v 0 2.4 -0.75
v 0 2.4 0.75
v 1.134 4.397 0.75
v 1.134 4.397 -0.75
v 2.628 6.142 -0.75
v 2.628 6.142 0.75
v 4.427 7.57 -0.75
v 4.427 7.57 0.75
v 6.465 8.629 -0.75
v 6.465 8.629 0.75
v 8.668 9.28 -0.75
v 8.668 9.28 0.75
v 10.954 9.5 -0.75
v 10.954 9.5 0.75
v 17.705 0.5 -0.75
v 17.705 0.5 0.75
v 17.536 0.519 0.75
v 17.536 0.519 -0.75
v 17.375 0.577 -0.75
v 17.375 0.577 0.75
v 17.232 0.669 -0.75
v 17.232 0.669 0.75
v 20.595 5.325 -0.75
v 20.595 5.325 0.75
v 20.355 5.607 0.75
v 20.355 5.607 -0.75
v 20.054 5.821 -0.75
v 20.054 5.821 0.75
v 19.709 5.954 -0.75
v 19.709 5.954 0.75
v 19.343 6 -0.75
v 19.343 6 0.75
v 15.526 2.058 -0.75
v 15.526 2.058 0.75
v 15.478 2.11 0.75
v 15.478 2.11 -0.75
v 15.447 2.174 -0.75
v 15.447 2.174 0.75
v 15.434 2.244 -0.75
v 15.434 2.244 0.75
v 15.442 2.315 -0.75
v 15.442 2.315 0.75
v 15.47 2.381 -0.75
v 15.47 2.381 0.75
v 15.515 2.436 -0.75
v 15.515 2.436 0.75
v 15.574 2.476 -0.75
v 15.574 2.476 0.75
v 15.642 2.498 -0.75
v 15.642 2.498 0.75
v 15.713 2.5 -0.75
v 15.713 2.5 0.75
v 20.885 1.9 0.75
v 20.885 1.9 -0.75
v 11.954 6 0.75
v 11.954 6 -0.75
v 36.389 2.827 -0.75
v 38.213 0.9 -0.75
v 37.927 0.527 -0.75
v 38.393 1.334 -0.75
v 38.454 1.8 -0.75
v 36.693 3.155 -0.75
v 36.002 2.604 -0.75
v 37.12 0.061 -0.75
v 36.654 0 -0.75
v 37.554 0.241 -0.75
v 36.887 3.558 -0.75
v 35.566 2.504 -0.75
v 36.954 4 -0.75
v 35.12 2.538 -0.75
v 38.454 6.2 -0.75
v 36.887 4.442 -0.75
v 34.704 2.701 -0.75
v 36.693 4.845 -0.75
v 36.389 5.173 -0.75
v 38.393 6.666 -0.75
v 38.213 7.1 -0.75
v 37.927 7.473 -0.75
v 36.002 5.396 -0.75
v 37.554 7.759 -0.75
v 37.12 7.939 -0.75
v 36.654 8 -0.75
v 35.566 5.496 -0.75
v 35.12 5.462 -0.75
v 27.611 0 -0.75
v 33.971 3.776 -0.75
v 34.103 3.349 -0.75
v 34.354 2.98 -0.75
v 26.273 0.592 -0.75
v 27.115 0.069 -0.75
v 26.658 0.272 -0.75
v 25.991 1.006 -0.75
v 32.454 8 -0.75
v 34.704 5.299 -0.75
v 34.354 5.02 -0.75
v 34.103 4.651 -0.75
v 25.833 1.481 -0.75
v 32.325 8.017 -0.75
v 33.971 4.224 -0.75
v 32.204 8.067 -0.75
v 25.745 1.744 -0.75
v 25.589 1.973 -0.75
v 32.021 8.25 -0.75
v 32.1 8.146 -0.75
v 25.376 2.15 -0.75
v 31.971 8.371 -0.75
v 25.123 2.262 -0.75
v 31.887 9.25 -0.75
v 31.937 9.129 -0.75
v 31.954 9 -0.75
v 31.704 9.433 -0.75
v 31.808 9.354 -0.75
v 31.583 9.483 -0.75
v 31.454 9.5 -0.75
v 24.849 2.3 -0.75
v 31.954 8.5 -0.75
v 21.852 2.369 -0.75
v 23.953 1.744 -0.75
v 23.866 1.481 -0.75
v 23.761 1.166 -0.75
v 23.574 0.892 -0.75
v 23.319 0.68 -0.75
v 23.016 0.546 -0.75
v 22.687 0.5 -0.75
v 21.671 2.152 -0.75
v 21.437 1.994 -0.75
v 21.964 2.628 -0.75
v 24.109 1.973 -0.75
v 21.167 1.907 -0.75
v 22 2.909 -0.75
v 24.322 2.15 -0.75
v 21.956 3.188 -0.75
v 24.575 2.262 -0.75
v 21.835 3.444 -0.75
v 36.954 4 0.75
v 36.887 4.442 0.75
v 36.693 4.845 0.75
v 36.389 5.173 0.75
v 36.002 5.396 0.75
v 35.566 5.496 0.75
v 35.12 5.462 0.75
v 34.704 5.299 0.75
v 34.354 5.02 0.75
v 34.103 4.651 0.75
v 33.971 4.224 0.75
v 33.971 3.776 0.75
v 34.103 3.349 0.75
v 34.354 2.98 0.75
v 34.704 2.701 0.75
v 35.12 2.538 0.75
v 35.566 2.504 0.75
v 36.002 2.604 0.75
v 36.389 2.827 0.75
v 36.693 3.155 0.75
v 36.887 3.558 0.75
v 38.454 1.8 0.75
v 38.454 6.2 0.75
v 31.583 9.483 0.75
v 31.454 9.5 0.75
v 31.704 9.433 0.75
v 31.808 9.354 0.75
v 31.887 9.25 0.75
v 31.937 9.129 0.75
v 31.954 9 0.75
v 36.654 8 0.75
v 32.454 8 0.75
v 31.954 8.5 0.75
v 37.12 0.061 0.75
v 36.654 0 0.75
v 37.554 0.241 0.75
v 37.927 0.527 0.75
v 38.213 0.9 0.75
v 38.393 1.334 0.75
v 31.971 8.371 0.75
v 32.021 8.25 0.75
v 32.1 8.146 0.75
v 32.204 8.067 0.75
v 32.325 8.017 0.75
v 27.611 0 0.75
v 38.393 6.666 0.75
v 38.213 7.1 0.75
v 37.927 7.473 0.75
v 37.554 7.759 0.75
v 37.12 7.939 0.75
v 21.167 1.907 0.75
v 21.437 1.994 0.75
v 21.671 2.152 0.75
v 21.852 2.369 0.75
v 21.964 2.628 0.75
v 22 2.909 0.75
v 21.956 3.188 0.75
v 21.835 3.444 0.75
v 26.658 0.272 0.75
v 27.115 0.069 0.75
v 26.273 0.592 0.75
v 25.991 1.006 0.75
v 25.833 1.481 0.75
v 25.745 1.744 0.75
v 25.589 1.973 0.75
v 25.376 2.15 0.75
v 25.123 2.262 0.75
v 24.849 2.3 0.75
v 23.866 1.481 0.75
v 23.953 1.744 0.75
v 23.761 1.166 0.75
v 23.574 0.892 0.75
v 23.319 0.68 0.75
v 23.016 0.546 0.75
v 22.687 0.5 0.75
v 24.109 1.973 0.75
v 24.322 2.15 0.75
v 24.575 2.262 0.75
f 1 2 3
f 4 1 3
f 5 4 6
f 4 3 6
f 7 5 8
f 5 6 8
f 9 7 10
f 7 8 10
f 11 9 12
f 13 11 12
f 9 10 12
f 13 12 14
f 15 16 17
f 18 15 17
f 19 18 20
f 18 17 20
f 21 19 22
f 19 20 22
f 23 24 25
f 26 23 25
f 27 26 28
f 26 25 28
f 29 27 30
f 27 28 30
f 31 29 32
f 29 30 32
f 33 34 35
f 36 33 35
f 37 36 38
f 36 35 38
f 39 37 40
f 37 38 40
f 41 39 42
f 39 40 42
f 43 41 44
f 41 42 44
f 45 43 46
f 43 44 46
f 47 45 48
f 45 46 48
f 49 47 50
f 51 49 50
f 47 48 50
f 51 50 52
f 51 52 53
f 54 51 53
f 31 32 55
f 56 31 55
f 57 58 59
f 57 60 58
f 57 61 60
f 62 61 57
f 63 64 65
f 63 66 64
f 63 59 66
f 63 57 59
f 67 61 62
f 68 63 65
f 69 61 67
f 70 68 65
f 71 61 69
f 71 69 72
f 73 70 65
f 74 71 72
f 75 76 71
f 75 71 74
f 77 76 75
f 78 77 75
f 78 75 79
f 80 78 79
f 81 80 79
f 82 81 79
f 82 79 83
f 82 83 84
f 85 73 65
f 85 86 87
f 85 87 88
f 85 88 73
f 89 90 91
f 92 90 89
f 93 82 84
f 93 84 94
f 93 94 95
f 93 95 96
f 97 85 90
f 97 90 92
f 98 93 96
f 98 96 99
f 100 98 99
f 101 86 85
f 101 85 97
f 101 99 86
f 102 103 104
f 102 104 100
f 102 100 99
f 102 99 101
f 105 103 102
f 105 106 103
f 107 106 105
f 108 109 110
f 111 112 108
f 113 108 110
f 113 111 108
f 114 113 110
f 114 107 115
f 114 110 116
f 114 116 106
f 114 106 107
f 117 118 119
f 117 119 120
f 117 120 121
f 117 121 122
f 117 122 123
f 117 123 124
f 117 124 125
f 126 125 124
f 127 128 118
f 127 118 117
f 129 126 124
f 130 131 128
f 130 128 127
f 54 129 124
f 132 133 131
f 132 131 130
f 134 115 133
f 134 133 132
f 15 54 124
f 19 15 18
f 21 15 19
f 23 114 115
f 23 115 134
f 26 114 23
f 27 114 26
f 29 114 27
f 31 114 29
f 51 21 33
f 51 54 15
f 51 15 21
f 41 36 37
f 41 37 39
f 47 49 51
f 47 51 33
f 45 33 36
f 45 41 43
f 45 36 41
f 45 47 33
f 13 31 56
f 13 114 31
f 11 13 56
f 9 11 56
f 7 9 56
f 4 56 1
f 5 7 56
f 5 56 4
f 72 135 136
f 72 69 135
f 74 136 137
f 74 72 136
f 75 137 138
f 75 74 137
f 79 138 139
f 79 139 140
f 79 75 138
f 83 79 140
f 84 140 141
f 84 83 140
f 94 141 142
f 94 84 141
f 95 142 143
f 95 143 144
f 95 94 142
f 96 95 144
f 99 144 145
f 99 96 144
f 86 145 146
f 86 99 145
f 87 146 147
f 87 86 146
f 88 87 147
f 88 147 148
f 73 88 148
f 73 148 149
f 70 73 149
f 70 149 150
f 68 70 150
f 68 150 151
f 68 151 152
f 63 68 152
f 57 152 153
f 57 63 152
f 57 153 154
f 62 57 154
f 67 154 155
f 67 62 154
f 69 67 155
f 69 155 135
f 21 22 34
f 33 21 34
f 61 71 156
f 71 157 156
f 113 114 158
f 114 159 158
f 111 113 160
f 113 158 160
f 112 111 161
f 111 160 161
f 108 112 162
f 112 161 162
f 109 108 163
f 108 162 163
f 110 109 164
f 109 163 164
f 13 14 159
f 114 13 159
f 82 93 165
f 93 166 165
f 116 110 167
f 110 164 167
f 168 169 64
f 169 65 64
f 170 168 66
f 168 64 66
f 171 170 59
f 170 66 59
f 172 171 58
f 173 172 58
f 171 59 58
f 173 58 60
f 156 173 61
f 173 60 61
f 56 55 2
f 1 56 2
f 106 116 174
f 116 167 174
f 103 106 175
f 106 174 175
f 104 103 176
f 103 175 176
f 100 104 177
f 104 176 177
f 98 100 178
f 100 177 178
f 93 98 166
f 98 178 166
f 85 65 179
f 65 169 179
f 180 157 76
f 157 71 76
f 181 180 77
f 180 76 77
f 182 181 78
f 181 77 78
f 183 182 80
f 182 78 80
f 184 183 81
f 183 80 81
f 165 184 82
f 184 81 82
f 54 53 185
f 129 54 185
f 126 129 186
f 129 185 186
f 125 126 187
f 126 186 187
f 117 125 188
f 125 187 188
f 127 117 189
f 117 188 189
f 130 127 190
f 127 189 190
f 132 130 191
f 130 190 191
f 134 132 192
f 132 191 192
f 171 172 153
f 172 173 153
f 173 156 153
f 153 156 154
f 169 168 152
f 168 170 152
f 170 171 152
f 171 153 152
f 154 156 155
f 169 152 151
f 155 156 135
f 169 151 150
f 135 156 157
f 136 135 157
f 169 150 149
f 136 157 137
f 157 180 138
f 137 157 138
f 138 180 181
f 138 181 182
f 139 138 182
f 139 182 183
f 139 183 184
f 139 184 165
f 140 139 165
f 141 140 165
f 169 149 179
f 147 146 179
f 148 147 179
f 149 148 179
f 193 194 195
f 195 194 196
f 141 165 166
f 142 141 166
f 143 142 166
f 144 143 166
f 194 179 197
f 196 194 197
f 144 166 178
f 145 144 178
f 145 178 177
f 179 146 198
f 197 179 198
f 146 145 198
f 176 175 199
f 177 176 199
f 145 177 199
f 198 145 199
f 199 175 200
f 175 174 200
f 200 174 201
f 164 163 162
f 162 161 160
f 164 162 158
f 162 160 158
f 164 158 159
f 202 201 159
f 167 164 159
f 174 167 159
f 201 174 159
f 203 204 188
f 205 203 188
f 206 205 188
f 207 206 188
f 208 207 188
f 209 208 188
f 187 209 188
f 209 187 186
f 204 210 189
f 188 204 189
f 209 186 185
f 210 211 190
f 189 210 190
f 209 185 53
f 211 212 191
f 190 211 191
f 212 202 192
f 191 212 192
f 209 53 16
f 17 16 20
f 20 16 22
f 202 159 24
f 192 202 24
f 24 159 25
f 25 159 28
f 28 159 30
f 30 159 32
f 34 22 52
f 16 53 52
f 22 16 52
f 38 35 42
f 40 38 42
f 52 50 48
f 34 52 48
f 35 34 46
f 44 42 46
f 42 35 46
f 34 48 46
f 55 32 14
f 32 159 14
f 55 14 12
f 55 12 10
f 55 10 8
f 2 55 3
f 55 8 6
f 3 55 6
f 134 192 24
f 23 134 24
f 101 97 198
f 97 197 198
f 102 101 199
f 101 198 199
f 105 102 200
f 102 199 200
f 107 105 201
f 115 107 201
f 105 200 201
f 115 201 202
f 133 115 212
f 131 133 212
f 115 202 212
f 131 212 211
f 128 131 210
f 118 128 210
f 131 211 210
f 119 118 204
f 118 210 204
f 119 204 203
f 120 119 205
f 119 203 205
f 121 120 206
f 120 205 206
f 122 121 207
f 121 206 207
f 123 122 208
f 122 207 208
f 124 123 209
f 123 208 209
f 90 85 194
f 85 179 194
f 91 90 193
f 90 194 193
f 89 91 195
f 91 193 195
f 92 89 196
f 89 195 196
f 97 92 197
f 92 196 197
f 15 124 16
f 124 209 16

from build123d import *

# Parameters (mm, degrees)
SKETCH1_R           = 1.5
BOSS_EXTRUDE1_DEPTH = 0.75
FILLET1_R           = 1.8


with BuildPart() as part:
    # Sketch1 → Boss-Extrude1 (new, symmetric)
    with BuildSketch(Plane.XY):
        with BuildLine():
            Line((10.953994705, 9.5), (31.453994705, 9.5))
            ThreePointArc((31.453994705, 9.5), (31.807548096, 9.353553391), (31.953994705, 9))
            Line((31.953994705, 9), (31.953994705, 8.5))
            ThreePointArc((31.953994705, 8.5), (32.100441315, 8.146446609), (32.453994705, 8))
            Line((32.453994705, 8), (38.453994705, 8))
            Line((38.453994705, 8), (38.453994705, 0))
            Line((38.453994705, 0), (27.61132699, 0))
            ThreePointArc((27.61132699, 0), (26.453994705, 0.418752726), (25.83256534, 1.481107378))
            ThreePointArc((25.83256534, 1.481107378), (24.849102012, 2.3), (23.865638684, 1.481107378))
            ThreePointArc((23.865638684, 1.481107378), (23.453994705, 0.777387983), (22.687360725, 0.5))
            Line((22.687360725, 0.5), (17.705397605, 0.5))
            ThreePointArc((17.705397605, 0.5), (17.453994705, 0.543390786), (17.231681323, 0.668542449))
            Line((17.231681323, 0.668542449), (15.526396166, 2.057846521))
            ThreePointArc((15.526396166, 2.057846521), (15.453994705, 2.348921744), (15.713112665, 2.5))
            Line((15.713112665, 2.5), (20.884755714, 1.9))
            ThreePointArc((20.884755714, 1.9), (21.851554423, 2.369070966), (21.83503998, 3.44352645))
            Line((21.83503998, 3.44352645), (20.595191848, 5.325283904))
            ThreePointArc((20.595191848, 5.325283904), (20.053994705, 5.820591886), (19.342631878, 6))
            Line((19.342631878, 6), (11.953994705, 6))
            Line((11.953994705, 6), (0, 2.4))
            ThreePointArc((0, 2.4), (4.427127156, 7.5697567), (10.953994705, 9.5))
        make_face()
        with Locations((35.453994705, 4)):
            Circle(SKETCH1_R, mode=Mode.SUBTRACT)
    extrude(amount=BOSS_EXTRUDE1_DEPTH, both=True)

    # Fillet1
    fillet1_edges = [part.edges().sort_by_distance(p)[0] for p in [
        (38.453994705, 8, 0),
        (38.453994705, 0, 0),
    ]]
    fillet(fillet1_edges, radius=FILLET1_R)


solid = part.part
